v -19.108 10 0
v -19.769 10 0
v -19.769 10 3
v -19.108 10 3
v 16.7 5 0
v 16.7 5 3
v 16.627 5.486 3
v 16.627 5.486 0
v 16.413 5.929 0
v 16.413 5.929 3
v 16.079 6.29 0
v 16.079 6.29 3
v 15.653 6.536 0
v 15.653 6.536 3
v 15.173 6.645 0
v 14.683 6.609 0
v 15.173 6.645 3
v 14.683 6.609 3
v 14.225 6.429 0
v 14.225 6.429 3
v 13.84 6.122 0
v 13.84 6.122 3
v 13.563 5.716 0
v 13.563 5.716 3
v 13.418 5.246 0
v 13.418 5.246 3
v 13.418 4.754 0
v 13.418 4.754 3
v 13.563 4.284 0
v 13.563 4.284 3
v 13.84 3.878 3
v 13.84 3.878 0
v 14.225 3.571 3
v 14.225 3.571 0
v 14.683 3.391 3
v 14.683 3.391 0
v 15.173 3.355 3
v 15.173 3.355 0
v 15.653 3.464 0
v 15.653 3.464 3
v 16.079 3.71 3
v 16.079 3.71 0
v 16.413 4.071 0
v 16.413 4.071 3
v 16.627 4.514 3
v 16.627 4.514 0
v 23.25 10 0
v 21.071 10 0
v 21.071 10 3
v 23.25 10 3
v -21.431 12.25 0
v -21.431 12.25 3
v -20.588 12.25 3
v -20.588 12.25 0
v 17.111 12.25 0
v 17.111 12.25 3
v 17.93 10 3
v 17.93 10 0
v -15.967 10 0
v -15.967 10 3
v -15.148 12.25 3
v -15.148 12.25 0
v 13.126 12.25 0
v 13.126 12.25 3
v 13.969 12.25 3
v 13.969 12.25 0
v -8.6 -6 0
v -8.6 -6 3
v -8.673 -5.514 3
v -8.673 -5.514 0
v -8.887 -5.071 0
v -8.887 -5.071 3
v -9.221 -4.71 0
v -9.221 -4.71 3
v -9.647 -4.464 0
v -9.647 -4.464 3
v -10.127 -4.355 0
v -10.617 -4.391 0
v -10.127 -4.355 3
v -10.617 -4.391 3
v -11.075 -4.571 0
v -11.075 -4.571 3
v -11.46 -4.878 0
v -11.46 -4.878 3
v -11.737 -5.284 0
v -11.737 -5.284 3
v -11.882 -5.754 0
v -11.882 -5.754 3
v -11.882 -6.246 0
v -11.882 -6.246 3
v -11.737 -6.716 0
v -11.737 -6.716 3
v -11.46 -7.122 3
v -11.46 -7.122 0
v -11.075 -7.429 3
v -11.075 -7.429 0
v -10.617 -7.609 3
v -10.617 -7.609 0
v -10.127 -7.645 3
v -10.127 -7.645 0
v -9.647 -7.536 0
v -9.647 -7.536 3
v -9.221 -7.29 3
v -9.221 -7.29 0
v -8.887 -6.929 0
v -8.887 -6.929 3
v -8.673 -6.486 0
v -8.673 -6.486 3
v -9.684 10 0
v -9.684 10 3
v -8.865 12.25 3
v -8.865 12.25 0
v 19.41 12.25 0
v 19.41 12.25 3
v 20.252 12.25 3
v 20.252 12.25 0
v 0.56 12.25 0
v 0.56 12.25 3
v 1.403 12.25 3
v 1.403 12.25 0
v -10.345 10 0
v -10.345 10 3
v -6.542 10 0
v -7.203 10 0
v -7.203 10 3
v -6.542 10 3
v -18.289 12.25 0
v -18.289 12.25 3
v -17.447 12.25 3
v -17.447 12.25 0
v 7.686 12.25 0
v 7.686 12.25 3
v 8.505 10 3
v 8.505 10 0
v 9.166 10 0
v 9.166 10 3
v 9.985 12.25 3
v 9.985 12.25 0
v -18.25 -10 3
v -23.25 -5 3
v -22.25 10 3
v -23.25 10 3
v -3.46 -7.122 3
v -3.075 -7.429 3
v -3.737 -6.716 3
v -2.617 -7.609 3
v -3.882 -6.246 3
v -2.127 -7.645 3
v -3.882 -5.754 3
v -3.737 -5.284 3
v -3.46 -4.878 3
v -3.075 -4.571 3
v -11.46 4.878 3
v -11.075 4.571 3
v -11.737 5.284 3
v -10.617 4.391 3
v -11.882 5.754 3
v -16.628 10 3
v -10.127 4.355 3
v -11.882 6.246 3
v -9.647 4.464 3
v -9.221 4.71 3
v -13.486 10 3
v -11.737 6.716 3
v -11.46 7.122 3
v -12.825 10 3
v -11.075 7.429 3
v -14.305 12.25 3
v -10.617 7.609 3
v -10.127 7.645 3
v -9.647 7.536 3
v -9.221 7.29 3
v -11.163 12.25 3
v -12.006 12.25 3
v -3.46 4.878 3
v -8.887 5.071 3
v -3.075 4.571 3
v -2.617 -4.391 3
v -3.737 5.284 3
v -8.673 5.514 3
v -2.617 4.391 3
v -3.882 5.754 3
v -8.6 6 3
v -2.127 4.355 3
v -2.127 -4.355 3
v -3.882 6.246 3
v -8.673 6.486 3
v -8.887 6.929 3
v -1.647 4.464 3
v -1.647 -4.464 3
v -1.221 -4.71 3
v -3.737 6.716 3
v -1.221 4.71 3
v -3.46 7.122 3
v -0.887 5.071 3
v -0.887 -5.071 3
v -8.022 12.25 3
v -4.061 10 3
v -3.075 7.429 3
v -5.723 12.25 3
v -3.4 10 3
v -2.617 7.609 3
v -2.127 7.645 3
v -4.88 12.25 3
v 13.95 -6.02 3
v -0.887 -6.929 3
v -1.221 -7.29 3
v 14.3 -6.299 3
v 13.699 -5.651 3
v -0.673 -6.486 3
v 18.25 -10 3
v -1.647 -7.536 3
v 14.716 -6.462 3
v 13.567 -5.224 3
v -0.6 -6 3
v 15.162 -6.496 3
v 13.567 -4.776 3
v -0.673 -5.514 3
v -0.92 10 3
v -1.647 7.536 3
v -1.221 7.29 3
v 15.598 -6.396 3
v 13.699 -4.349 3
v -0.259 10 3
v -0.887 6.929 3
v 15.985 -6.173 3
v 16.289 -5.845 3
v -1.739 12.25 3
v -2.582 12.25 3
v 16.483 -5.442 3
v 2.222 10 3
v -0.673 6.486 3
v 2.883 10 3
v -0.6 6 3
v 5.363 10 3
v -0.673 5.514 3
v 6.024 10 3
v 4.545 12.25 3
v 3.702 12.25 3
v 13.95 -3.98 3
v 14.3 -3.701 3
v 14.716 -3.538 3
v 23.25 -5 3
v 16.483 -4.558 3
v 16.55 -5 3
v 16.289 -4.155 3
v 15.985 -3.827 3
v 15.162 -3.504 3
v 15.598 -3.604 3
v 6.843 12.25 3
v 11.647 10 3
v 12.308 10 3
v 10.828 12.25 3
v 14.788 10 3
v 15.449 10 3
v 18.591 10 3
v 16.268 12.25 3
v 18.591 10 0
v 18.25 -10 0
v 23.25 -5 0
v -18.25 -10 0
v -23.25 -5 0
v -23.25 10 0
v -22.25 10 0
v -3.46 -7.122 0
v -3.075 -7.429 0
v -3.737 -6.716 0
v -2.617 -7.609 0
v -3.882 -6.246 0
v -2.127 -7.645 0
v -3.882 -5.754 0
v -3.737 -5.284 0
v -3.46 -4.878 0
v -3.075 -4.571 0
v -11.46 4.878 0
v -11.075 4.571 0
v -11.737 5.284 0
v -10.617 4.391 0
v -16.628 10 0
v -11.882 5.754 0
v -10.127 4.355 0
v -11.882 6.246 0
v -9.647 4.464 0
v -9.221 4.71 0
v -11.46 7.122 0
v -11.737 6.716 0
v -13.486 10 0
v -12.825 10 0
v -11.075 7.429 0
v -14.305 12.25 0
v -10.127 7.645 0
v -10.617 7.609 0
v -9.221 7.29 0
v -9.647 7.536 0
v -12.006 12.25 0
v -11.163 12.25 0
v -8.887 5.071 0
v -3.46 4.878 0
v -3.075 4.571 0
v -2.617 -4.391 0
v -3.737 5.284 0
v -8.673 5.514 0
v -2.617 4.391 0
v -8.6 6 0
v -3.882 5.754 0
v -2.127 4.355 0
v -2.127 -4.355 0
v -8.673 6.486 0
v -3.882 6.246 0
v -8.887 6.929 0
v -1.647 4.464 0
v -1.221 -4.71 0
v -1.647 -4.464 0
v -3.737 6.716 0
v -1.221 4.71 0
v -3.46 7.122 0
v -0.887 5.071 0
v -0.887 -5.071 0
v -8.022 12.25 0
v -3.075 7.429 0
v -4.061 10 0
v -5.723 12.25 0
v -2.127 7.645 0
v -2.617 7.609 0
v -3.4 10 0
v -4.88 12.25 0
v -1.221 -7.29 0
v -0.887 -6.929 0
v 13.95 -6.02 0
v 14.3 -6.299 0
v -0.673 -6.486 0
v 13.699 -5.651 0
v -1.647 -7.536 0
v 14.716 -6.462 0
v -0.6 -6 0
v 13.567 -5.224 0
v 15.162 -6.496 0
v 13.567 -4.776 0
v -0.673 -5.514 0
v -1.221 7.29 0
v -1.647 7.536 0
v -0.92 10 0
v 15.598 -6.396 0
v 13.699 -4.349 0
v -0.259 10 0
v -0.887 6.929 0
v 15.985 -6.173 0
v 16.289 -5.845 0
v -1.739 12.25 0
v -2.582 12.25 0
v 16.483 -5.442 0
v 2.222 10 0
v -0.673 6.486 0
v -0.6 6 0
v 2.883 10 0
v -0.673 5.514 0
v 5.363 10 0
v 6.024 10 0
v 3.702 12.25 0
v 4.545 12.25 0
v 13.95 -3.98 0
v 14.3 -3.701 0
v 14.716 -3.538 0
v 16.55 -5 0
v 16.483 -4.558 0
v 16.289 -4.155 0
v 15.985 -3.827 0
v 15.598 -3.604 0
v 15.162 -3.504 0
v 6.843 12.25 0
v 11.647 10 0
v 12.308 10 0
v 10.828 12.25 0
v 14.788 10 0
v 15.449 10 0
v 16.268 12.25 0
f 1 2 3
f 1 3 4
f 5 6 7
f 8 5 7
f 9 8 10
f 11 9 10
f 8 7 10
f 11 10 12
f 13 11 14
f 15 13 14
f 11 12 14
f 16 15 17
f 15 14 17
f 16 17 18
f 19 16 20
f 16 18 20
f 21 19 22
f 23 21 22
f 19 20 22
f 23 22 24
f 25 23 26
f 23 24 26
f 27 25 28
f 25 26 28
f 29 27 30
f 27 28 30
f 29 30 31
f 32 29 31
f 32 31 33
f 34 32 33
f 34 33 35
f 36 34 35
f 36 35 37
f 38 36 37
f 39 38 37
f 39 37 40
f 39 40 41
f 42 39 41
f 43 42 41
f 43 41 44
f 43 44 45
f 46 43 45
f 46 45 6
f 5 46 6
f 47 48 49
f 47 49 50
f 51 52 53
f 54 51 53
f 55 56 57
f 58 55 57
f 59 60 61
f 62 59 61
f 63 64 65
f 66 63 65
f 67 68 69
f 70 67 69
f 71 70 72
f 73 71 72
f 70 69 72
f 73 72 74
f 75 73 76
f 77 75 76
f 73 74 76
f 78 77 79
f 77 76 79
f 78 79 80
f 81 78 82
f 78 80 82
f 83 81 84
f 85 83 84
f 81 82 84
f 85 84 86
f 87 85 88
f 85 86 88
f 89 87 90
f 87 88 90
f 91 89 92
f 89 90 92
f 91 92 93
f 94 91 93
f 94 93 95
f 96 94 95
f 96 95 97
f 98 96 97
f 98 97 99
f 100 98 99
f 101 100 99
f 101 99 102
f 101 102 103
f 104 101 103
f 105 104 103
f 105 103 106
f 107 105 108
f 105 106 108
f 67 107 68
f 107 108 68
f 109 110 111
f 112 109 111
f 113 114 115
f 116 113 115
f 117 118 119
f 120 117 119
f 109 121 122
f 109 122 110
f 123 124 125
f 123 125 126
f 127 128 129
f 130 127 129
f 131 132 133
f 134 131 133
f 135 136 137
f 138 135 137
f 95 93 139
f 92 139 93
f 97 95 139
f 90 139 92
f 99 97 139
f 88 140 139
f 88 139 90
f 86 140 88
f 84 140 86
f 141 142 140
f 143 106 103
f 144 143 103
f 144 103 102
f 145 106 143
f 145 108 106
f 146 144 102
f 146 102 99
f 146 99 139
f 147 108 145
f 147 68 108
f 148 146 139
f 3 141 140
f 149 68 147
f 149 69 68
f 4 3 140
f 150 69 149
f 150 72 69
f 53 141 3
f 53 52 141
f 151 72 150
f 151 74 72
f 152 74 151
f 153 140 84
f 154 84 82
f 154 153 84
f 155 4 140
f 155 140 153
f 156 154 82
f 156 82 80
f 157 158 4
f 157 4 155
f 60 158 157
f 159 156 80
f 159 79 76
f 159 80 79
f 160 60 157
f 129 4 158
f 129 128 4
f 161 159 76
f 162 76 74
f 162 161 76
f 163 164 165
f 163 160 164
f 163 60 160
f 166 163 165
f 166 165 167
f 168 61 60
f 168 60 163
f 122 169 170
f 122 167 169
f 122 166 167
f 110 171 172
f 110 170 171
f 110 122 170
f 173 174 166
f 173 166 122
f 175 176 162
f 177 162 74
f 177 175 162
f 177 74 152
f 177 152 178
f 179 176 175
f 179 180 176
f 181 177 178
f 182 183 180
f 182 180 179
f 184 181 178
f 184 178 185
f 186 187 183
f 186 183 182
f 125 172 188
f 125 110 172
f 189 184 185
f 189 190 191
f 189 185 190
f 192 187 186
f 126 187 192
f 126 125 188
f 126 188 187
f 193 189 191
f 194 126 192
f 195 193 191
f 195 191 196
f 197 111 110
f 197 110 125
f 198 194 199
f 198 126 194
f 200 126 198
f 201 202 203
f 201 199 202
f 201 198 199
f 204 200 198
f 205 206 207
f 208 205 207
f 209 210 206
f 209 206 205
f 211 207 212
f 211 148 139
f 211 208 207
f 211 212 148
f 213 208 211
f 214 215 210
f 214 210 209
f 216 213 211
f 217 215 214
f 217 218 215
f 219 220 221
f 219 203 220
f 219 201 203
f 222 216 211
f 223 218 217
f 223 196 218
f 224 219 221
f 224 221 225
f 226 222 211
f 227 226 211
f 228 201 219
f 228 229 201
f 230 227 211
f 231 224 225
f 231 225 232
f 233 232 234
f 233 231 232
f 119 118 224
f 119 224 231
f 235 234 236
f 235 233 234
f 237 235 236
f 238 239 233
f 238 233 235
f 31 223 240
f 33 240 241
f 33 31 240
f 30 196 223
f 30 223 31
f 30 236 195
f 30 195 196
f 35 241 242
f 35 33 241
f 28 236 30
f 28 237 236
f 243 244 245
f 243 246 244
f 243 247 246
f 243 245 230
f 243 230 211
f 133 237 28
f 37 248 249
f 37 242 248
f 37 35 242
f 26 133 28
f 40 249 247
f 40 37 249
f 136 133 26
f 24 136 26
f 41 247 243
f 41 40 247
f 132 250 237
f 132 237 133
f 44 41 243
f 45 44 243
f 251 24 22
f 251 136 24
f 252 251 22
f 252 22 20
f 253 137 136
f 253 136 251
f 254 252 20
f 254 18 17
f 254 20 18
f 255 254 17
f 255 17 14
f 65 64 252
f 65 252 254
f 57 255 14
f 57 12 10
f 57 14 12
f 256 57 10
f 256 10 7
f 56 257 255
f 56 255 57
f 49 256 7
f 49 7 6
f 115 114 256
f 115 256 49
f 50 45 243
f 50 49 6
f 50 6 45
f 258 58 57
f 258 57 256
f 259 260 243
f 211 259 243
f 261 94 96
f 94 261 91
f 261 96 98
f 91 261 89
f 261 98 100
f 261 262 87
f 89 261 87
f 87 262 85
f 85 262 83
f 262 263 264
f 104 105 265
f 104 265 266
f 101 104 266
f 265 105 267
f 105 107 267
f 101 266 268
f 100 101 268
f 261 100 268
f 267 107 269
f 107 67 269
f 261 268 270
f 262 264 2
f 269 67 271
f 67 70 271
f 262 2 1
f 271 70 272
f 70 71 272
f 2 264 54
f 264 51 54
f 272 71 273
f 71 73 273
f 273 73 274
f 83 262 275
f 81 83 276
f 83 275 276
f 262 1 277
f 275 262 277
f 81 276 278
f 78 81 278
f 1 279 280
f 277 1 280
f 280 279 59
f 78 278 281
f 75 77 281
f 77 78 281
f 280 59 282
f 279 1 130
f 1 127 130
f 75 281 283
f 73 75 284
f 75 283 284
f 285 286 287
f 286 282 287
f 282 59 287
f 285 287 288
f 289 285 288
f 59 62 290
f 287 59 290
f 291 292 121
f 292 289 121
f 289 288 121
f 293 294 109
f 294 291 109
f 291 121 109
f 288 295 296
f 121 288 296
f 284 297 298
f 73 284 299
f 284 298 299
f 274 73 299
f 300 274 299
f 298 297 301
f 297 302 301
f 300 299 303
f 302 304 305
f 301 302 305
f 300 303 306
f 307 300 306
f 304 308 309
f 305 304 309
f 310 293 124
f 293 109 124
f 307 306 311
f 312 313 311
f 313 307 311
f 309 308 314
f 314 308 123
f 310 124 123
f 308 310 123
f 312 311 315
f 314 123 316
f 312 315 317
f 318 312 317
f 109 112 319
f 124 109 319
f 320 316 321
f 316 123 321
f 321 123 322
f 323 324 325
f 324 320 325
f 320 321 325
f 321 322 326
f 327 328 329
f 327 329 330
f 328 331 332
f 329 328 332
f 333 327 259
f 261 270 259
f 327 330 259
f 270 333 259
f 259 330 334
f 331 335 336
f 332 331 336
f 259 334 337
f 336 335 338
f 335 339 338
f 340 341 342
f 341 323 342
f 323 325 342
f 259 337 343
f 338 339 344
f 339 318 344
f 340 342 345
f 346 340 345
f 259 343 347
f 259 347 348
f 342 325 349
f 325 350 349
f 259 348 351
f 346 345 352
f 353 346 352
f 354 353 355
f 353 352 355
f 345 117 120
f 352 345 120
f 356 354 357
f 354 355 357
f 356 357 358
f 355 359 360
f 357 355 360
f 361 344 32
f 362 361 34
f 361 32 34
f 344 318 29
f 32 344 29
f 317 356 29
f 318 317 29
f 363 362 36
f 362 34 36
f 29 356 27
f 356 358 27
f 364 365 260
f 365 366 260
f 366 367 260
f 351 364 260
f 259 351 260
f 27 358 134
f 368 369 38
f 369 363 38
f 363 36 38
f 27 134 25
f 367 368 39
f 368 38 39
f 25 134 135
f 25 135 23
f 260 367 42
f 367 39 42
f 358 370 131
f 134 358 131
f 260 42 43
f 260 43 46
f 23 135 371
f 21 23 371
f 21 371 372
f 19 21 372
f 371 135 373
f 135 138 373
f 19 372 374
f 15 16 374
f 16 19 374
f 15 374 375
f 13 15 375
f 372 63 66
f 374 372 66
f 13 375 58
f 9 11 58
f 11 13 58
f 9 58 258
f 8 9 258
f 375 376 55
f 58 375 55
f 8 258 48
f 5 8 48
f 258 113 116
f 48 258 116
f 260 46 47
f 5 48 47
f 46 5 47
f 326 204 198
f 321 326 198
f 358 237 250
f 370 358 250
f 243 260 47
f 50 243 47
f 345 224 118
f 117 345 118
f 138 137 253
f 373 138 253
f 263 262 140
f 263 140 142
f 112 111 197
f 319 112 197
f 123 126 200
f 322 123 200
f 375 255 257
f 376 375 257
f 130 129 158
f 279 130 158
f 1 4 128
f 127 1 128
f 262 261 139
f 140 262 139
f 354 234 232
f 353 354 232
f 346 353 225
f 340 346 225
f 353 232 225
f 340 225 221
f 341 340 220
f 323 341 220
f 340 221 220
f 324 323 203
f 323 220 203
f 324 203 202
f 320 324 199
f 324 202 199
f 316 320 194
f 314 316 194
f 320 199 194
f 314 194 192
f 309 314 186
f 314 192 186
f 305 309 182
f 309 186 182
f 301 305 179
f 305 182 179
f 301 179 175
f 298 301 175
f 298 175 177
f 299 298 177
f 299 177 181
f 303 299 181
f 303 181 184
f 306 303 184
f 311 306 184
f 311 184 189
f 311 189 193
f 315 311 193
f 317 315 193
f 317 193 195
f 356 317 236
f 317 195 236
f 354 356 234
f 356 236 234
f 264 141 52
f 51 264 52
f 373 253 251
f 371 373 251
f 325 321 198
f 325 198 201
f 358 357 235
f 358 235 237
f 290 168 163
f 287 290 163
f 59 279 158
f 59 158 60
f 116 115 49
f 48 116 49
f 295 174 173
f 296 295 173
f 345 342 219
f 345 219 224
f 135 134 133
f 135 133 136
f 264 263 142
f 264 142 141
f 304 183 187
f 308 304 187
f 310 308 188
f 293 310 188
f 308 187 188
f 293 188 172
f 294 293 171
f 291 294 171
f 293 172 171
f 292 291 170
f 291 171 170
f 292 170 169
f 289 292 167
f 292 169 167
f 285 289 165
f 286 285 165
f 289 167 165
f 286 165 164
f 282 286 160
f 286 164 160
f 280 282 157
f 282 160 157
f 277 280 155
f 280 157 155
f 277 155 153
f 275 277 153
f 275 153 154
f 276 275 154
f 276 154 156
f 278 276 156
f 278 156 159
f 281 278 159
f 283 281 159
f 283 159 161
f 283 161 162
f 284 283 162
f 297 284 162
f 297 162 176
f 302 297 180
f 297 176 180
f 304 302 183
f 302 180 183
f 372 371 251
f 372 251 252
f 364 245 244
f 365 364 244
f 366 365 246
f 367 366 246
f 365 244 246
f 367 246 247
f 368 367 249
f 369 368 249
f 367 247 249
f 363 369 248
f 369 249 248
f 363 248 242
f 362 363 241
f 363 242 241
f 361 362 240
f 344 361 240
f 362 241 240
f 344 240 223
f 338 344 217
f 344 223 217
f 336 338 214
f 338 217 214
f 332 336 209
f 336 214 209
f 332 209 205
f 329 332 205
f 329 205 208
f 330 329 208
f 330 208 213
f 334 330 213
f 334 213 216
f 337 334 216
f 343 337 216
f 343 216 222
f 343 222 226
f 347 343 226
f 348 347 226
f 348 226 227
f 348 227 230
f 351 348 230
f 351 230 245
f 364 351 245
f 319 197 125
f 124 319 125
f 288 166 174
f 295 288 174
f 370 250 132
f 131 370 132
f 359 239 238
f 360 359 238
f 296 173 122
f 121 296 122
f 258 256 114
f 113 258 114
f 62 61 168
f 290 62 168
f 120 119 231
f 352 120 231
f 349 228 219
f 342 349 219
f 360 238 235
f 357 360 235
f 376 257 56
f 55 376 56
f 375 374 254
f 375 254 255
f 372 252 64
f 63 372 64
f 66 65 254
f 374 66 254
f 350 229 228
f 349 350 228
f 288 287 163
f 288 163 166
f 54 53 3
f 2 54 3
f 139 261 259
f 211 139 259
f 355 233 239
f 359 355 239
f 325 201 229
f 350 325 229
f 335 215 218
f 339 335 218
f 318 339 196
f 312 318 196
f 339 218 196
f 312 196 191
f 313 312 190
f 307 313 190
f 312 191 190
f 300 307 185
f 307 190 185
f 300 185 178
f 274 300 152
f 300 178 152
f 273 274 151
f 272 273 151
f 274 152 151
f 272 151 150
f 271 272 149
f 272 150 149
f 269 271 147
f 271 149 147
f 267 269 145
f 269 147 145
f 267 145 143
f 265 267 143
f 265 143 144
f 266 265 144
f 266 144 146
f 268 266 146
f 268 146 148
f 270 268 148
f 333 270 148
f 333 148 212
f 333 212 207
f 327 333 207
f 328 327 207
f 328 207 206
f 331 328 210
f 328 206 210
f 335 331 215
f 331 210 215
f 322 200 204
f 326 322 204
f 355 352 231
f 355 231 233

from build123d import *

# Parameters (mm, degrees)
SKETCH_1_W             = 46.5
SKETCH_1_H             = 20
EXTRUDE_1_DEPTH        = 3
EXTRUDE_2_DEPTH        = 3
PATTERN_LINEAR_1_COUNT = 14
PATTERN_LINEAR_1_PITCH = 3.141592654
SKETCH_3_R             = 1.65
CUT_EXTRUDE_1_DEPTH    = 3
SKETCH_4_R             = 1.65
SKETCH_4_R_2           = 1.5
CUT_EXTRUDE_2_DEPTH    = 10
CHAMFER_1_SIZE         = 5


with BuildPart() as part:
    # 草圖1 → 填料-伸長1 (new body)
    with BuildSketch(Plane.XY):
        Rectangle(SKETCH_1_W, SKETCH_1_H)
    extrude(amount=EXTRUDE_1_DEPTH)

    # 草圖2 → 填料-伸長2 (add)
    with BuildSketch(Plane.XY.offset(3)):
        Polygon((-22.25, 10), (-21.431066973, 12.25), (-20.588211115, 12.25), (-19.769278088, 10), align=None)
    extrude_2 = extrude(amount=-EXTRUDE_2_DEPTH)

    # 直線複製排列1: 填料-伸長2 ×14
    with Locations(*[(i * PATTERN_LINEAR_1_PITCH, 0, 0) for i in range(1, PATTERN_LINEAR_1_COUNT)]):
        add(extrude_2)

    # 草圖3 → 除料-伸長1 (cut)
    with BuildSketch(Plane.XY.offset(3)):
        with Locations((-10.25, 6)):
            Circle(SKETCH_3_R)
        with Locations((-2.25, 6)):
            Circle(SKETCH_3_R)
        with Locations((-2.25, -6)):
            Circle(SKETCH_3_R)
        with Locations((-10.25, -6)):
            Circle(SKETCH_3_R)
    extrude(amount=-CUT_EXTRUDE_1_DEPTH, mode=Mode.SUBTRACT)

    # 草圖4 → 除料-伸長2 (cut)
    with BuildSketch(Plane.XY.offset(3)):
        with Locations((15.05, 5)):
            Circle(SKETCH_4_R)
        with Locations((15.05, -5)):
            Circle(SKETCH_4_R_2)
    extrude(amount=-CUT_EXTRUDE_2_DEPTH, mode=Mode.SUBTRACT)

    # 導角1
    chamfer_1_edges = [part.edges().sort_by_distance(p)[0] for p in [
        (23.25, -10, 1.5),
        (-23.25, -10, 1.5),
    ]]
    chamfer(chamfer_1_edges, length=CHAMFER_1_SIZE)


solid = part.part
